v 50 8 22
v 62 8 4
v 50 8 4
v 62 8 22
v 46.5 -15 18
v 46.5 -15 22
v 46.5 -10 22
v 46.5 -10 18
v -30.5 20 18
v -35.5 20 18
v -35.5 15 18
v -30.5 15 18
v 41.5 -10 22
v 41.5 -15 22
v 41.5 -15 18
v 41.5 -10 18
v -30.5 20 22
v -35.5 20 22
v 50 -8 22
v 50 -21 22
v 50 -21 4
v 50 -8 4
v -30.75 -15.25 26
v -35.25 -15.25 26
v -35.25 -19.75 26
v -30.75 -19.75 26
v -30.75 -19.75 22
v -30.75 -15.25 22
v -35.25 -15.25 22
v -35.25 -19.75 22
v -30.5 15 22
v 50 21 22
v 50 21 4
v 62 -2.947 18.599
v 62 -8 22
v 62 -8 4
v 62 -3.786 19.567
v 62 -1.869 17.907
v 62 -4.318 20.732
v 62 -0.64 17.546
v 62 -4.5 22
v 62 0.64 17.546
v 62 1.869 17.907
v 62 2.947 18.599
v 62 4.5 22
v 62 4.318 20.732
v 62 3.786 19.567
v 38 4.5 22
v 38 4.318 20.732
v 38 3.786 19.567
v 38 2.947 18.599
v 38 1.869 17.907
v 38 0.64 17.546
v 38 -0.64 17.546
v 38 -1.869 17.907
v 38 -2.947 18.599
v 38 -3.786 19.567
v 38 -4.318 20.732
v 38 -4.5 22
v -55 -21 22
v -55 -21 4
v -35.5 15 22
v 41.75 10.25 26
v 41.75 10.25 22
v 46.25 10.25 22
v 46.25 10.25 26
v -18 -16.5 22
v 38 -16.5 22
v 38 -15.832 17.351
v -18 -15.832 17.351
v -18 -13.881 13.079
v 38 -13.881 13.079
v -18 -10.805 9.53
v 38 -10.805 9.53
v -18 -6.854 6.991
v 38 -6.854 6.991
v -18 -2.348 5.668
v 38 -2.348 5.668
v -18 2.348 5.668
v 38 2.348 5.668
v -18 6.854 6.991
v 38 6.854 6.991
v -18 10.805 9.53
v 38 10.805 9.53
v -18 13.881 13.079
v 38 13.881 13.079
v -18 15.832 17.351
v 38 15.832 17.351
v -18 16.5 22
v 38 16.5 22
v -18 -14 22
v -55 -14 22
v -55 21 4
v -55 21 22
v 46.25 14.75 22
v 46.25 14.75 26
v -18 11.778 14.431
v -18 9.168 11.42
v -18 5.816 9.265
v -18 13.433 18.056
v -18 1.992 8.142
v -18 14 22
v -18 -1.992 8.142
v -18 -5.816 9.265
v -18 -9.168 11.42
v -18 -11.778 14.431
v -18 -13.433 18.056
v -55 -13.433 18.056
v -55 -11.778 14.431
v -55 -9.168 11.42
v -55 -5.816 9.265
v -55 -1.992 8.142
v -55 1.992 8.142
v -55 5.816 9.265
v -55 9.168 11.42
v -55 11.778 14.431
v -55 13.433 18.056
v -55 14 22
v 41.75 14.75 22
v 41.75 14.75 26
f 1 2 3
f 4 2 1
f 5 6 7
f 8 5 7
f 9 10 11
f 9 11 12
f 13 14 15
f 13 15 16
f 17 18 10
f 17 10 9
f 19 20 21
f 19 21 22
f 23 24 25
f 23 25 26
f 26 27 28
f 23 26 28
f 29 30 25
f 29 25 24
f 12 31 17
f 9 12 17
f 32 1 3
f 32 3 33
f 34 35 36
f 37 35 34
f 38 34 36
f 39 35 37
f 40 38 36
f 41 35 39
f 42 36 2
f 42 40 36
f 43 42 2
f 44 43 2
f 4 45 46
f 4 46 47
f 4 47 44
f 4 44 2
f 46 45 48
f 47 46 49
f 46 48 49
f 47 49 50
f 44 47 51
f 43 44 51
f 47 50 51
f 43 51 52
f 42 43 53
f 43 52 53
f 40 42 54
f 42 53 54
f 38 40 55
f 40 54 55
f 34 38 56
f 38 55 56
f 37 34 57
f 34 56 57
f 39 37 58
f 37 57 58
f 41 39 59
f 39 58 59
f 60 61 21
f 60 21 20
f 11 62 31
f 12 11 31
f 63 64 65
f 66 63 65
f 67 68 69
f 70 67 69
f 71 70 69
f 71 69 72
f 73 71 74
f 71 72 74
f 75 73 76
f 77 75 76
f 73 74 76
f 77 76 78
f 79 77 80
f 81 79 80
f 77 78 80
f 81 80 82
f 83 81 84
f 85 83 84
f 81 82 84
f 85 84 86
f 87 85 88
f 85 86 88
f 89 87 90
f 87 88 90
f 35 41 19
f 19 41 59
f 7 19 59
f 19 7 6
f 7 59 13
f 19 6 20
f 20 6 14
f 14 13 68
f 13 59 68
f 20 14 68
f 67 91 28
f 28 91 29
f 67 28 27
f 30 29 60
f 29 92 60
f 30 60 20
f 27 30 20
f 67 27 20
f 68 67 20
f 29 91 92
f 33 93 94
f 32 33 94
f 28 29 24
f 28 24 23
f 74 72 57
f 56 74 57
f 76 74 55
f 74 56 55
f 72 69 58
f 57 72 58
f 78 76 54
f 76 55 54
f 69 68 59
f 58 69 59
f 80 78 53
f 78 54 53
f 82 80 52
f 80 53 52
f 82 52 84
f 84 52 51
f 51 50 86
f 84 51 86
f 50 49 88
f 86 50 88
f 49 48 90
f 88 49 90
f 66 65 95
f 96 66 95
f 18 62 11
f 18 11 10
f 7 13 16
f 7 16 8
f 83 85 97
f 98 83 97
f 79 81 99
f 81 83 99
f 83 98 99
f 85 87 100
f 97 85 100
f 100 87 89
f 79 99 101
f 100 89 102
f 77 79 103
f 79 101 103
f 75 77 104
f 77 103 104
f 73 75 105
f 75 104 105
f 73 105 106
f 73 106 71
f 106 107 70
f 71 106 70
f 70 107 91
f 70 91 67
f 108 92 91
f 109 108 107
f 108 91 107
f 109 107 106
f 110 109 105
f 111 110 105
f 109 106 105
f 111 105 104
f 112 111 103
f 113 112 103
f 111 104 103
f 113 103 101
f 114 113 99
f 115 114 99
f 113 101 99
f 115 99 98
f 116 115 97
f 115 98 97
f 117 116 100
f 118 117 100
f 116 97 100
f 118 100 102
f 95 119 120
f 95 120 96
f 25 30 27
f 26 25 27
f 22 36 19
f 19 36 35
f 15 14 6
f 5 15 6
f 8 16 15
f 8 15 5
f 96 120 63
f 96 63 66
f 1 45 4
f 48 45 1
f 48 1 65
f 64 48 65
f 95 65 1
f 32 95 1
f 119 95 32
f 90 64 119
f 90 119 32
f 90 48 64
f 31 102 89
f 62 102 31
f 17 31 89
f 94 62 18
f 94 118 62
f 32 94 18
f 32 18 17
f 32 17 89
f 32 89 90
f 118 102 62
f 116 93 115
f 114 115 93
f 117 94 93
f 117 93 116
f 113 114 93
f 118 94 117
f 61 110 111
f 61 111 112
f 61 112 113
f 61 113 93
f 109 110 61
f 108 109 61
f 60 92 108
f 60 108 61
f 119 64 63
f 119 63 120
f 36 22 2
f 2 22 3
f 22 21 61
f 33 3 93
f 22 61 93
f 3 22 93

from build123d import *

# Parameters (mm, degrees)
F0_W      = 80
F0_H      = 42
F1_DEPTH  = 22
F3_DEPTH  = 80
F4_DEPTH  = 2
F6_DEPTH  = 22
F7_DEPTH  = 28
F8_DEPTH  = 15
F9_DEPTH  = 2
F10_DEPTH = 10
F11_W     = 5
F11_H     = 5
F12_DEPTH = 4
F11_W_2   = 4.5
F11_H_2   = 4.5
F13_DEPTH = 4
F14_DEPTH = 12
F15_DEPTH = 4
F16_W     = 13
F16_H     = 18
F17_DEPTH = 12


# Not quite as in the source:
# - a feature names something its author has since deleted; it is built from what else it names


with BuildPart() as f1:
    # F0 (on Top) → F1 (new body)
    with BuildSketch(Plane.XY):
        Rectangle(F0_W, F0_H)
    extrude(amount=F1_DEPTH)

    # F2 (on face) → F3 (cut)
    with BuildSketch(Plane.YZ.offset(40)):
        with BuildLine():
            ThreePointArc((-16.5, 22), (0, 5.5), (16.5, 22))
            Line((16.5, 22), (14, 22))
            ThreePointArc((14, 22), (0, 8), (-14, 22))
            Line((-14, 22), (-16.5, 22))
        make_face()
        with BuildLine():
            ThreePointArc((-14, 22), (0, 8), (14, 22))
            Line((14, 22), (4.5, 22))
            ThreePointArc((4.5, 22), (0, 17.5), (-4.5, 22))
            Line((-4.5, 22), (-14, 22))
        make_face()
        with BuildLine():
            ThreePointArc((-4.5, 22), (0, 17.5), (4.5, 22))
            Line((4.5, 22), (-4.5, 22))
        make_face()
    extrude(amount=-F3_DEPTH, mode=Mode.SUBTRACT)

    # F2 (on face) → F4 (join)
    with BuildSketch(Plane.YZ.offset(40)):
        with BuildLine():
            ThreePointArc((-16.5, 22), (0, 5.5), (16.5, 22))
            Line((16.5, 22), (14, 22))
            ThreePointArc((14, 22), (0, 8), (-14, 22))
            Line((-14, 22), (-16.5, 22))
        make_face()
    extrude(amount=-F4_DEPTH)



with BuildPart() as f6:
    # F5 (on face) → F6 (new body)
    with BuildSketch(Plane(origin=(-40, 0, 0), x_dir=(0, -1, 0), z_dir=(-1, 0, 0))):
        with BuildLine():
            Line((-14, 22), (14, 22))
            ThreePointArc((14, 22), (0, 36), (-14, 22))
        make_face()
    extrude(amount=-F6_DEPTH)


with BuildPart() as f1_1:
    add(f1.part)

    add(f6.part)  # F6#2 merges F6
    # F5 (on face) → F6, piece 2 (join)
    with BuildSketch(Plane(origin=(-40, 0, 0), x_dir=(0, -1, 0), z_dir=(-1, 0, 0))):
        with BuildLine():
            Line((16.5, 22), (14, 22))
            ThreePointArc((14, 22), (0, 8), (-14, 22))
            Line((-14, 22), (-16.5, 22))
            ThreePointArc((-16.5, 22), (0, 5.5), (16.5, 22))
        make_face()
        with BuildLine():
            Line((21, 22), (16.5, 22))
            ThreePointArc((16.5, 22), (0, 5.5), (-16.5, 22))
            Line((-16.5, 22), (-21, 22))
            Line((-21, 22), (-21, 0))
            Line((-21, 0), (21, 0))
            Line((21, 0), (21, 22))
        make_face()
    extrude(amount=-F6_DEPTH)

    # F5 (on face) → F7 (cut)
    with BuildSketch(Plane(origin=(-40, 0, 0), x_dir=(0, -1, 0), z_dir=(-1, 0, 0))):
        with BuildLine():
            Line((-14, 22), (14, 22))
            ThreePointArc((14, 22), (0, 36), (-14, 22))
        make_face()
    extrude(amount=-F7_DEPTH, mode=Mode.SUBTRACT)

    # F8 (add): a face of the model
    f8_faces = [f1_1.faces().sort_by_distance(p)[0] for p in [
        (-40, 0, 0.4741307836),
    ]]
    extrude(f8_faces, amount=F8_DEPTH)

    # F2 (on face) → F9 (join)
    with BuildSketch(Plane.YZ.offset(40)):
        with BuildLine():
            ThreePointArc((-14, 22), (0, 8), (14, 22))
            Line((14, 22), (4.5, 22))
            ThreePointArc((4.5, 22), (0, 17.5), (-4.5, 22))
            Line((-4.5, 22), (-14, 22))
        make_face()
    extrude(amount=-F9_DEPTH)

    # F10 (add): a face of the model
    f10_faces = [f1_1.faces().sort_by_distance(p)[0] for p in [
        (40, 0, 10.6759160757),
    ]]
    extrude(f10_faces, amount=F10_DEPTH)

    # F11 (on face) → F12 (cut)
    with BuildSketch(Plane.XY.offset(22)):
        with Locations((-33, 17.5)):
            Rectangle(F11_W, F11_H)
        with Locations((44, -12.5)):
            Rectangle(F11_W, F11_H)
    extrude(amount=-F12_DEPTH, mode=Mode.SUBTRACT)

    # F11 (on face) → F13 (join)
    with BuildSketch(Plane.XY.offset(22)):
        with Locations((-33, -17.5)):
            Rectangle(F11_W_2, F11_H_2)
        with Locations((44, 12.5)):
            Rectangle(F11_W_2, F11_H_2)
    extrude(amount=F13_DEPTH)

    # F14 (add): a face of the model
    f14_faces = [f1_1.faces().sort_by_distance(p)[0] for p in [
        (50, 0, 10.6759160757),
    ]]
    extrude(f14_faces, amount=F14_DEPTH)

    # F15 (cut): a face of the model
    f15_faces = [f1_1.faces().sort_by_distance(p)[0] for p in [
        (3.5, 0, 0),
    ]]
    extrude(f15_faces, amount=-F15_DEPTH, mode=Mode.SUBTRACT)

    # F16 (on face) → F17 (cut)
    with BuildSketch(Plane.YZ.offset(62)):
        with Locations((-14.5, 13)):
            Rectangle(F16_W, F16_H)
        with Locations((14.5, 13)):
            Rectangle(F16_W, F16_H)
    extrude(amount=-F17_DEPTH, mode=Mode.SUBTRACT)


solid = f1_1.part
